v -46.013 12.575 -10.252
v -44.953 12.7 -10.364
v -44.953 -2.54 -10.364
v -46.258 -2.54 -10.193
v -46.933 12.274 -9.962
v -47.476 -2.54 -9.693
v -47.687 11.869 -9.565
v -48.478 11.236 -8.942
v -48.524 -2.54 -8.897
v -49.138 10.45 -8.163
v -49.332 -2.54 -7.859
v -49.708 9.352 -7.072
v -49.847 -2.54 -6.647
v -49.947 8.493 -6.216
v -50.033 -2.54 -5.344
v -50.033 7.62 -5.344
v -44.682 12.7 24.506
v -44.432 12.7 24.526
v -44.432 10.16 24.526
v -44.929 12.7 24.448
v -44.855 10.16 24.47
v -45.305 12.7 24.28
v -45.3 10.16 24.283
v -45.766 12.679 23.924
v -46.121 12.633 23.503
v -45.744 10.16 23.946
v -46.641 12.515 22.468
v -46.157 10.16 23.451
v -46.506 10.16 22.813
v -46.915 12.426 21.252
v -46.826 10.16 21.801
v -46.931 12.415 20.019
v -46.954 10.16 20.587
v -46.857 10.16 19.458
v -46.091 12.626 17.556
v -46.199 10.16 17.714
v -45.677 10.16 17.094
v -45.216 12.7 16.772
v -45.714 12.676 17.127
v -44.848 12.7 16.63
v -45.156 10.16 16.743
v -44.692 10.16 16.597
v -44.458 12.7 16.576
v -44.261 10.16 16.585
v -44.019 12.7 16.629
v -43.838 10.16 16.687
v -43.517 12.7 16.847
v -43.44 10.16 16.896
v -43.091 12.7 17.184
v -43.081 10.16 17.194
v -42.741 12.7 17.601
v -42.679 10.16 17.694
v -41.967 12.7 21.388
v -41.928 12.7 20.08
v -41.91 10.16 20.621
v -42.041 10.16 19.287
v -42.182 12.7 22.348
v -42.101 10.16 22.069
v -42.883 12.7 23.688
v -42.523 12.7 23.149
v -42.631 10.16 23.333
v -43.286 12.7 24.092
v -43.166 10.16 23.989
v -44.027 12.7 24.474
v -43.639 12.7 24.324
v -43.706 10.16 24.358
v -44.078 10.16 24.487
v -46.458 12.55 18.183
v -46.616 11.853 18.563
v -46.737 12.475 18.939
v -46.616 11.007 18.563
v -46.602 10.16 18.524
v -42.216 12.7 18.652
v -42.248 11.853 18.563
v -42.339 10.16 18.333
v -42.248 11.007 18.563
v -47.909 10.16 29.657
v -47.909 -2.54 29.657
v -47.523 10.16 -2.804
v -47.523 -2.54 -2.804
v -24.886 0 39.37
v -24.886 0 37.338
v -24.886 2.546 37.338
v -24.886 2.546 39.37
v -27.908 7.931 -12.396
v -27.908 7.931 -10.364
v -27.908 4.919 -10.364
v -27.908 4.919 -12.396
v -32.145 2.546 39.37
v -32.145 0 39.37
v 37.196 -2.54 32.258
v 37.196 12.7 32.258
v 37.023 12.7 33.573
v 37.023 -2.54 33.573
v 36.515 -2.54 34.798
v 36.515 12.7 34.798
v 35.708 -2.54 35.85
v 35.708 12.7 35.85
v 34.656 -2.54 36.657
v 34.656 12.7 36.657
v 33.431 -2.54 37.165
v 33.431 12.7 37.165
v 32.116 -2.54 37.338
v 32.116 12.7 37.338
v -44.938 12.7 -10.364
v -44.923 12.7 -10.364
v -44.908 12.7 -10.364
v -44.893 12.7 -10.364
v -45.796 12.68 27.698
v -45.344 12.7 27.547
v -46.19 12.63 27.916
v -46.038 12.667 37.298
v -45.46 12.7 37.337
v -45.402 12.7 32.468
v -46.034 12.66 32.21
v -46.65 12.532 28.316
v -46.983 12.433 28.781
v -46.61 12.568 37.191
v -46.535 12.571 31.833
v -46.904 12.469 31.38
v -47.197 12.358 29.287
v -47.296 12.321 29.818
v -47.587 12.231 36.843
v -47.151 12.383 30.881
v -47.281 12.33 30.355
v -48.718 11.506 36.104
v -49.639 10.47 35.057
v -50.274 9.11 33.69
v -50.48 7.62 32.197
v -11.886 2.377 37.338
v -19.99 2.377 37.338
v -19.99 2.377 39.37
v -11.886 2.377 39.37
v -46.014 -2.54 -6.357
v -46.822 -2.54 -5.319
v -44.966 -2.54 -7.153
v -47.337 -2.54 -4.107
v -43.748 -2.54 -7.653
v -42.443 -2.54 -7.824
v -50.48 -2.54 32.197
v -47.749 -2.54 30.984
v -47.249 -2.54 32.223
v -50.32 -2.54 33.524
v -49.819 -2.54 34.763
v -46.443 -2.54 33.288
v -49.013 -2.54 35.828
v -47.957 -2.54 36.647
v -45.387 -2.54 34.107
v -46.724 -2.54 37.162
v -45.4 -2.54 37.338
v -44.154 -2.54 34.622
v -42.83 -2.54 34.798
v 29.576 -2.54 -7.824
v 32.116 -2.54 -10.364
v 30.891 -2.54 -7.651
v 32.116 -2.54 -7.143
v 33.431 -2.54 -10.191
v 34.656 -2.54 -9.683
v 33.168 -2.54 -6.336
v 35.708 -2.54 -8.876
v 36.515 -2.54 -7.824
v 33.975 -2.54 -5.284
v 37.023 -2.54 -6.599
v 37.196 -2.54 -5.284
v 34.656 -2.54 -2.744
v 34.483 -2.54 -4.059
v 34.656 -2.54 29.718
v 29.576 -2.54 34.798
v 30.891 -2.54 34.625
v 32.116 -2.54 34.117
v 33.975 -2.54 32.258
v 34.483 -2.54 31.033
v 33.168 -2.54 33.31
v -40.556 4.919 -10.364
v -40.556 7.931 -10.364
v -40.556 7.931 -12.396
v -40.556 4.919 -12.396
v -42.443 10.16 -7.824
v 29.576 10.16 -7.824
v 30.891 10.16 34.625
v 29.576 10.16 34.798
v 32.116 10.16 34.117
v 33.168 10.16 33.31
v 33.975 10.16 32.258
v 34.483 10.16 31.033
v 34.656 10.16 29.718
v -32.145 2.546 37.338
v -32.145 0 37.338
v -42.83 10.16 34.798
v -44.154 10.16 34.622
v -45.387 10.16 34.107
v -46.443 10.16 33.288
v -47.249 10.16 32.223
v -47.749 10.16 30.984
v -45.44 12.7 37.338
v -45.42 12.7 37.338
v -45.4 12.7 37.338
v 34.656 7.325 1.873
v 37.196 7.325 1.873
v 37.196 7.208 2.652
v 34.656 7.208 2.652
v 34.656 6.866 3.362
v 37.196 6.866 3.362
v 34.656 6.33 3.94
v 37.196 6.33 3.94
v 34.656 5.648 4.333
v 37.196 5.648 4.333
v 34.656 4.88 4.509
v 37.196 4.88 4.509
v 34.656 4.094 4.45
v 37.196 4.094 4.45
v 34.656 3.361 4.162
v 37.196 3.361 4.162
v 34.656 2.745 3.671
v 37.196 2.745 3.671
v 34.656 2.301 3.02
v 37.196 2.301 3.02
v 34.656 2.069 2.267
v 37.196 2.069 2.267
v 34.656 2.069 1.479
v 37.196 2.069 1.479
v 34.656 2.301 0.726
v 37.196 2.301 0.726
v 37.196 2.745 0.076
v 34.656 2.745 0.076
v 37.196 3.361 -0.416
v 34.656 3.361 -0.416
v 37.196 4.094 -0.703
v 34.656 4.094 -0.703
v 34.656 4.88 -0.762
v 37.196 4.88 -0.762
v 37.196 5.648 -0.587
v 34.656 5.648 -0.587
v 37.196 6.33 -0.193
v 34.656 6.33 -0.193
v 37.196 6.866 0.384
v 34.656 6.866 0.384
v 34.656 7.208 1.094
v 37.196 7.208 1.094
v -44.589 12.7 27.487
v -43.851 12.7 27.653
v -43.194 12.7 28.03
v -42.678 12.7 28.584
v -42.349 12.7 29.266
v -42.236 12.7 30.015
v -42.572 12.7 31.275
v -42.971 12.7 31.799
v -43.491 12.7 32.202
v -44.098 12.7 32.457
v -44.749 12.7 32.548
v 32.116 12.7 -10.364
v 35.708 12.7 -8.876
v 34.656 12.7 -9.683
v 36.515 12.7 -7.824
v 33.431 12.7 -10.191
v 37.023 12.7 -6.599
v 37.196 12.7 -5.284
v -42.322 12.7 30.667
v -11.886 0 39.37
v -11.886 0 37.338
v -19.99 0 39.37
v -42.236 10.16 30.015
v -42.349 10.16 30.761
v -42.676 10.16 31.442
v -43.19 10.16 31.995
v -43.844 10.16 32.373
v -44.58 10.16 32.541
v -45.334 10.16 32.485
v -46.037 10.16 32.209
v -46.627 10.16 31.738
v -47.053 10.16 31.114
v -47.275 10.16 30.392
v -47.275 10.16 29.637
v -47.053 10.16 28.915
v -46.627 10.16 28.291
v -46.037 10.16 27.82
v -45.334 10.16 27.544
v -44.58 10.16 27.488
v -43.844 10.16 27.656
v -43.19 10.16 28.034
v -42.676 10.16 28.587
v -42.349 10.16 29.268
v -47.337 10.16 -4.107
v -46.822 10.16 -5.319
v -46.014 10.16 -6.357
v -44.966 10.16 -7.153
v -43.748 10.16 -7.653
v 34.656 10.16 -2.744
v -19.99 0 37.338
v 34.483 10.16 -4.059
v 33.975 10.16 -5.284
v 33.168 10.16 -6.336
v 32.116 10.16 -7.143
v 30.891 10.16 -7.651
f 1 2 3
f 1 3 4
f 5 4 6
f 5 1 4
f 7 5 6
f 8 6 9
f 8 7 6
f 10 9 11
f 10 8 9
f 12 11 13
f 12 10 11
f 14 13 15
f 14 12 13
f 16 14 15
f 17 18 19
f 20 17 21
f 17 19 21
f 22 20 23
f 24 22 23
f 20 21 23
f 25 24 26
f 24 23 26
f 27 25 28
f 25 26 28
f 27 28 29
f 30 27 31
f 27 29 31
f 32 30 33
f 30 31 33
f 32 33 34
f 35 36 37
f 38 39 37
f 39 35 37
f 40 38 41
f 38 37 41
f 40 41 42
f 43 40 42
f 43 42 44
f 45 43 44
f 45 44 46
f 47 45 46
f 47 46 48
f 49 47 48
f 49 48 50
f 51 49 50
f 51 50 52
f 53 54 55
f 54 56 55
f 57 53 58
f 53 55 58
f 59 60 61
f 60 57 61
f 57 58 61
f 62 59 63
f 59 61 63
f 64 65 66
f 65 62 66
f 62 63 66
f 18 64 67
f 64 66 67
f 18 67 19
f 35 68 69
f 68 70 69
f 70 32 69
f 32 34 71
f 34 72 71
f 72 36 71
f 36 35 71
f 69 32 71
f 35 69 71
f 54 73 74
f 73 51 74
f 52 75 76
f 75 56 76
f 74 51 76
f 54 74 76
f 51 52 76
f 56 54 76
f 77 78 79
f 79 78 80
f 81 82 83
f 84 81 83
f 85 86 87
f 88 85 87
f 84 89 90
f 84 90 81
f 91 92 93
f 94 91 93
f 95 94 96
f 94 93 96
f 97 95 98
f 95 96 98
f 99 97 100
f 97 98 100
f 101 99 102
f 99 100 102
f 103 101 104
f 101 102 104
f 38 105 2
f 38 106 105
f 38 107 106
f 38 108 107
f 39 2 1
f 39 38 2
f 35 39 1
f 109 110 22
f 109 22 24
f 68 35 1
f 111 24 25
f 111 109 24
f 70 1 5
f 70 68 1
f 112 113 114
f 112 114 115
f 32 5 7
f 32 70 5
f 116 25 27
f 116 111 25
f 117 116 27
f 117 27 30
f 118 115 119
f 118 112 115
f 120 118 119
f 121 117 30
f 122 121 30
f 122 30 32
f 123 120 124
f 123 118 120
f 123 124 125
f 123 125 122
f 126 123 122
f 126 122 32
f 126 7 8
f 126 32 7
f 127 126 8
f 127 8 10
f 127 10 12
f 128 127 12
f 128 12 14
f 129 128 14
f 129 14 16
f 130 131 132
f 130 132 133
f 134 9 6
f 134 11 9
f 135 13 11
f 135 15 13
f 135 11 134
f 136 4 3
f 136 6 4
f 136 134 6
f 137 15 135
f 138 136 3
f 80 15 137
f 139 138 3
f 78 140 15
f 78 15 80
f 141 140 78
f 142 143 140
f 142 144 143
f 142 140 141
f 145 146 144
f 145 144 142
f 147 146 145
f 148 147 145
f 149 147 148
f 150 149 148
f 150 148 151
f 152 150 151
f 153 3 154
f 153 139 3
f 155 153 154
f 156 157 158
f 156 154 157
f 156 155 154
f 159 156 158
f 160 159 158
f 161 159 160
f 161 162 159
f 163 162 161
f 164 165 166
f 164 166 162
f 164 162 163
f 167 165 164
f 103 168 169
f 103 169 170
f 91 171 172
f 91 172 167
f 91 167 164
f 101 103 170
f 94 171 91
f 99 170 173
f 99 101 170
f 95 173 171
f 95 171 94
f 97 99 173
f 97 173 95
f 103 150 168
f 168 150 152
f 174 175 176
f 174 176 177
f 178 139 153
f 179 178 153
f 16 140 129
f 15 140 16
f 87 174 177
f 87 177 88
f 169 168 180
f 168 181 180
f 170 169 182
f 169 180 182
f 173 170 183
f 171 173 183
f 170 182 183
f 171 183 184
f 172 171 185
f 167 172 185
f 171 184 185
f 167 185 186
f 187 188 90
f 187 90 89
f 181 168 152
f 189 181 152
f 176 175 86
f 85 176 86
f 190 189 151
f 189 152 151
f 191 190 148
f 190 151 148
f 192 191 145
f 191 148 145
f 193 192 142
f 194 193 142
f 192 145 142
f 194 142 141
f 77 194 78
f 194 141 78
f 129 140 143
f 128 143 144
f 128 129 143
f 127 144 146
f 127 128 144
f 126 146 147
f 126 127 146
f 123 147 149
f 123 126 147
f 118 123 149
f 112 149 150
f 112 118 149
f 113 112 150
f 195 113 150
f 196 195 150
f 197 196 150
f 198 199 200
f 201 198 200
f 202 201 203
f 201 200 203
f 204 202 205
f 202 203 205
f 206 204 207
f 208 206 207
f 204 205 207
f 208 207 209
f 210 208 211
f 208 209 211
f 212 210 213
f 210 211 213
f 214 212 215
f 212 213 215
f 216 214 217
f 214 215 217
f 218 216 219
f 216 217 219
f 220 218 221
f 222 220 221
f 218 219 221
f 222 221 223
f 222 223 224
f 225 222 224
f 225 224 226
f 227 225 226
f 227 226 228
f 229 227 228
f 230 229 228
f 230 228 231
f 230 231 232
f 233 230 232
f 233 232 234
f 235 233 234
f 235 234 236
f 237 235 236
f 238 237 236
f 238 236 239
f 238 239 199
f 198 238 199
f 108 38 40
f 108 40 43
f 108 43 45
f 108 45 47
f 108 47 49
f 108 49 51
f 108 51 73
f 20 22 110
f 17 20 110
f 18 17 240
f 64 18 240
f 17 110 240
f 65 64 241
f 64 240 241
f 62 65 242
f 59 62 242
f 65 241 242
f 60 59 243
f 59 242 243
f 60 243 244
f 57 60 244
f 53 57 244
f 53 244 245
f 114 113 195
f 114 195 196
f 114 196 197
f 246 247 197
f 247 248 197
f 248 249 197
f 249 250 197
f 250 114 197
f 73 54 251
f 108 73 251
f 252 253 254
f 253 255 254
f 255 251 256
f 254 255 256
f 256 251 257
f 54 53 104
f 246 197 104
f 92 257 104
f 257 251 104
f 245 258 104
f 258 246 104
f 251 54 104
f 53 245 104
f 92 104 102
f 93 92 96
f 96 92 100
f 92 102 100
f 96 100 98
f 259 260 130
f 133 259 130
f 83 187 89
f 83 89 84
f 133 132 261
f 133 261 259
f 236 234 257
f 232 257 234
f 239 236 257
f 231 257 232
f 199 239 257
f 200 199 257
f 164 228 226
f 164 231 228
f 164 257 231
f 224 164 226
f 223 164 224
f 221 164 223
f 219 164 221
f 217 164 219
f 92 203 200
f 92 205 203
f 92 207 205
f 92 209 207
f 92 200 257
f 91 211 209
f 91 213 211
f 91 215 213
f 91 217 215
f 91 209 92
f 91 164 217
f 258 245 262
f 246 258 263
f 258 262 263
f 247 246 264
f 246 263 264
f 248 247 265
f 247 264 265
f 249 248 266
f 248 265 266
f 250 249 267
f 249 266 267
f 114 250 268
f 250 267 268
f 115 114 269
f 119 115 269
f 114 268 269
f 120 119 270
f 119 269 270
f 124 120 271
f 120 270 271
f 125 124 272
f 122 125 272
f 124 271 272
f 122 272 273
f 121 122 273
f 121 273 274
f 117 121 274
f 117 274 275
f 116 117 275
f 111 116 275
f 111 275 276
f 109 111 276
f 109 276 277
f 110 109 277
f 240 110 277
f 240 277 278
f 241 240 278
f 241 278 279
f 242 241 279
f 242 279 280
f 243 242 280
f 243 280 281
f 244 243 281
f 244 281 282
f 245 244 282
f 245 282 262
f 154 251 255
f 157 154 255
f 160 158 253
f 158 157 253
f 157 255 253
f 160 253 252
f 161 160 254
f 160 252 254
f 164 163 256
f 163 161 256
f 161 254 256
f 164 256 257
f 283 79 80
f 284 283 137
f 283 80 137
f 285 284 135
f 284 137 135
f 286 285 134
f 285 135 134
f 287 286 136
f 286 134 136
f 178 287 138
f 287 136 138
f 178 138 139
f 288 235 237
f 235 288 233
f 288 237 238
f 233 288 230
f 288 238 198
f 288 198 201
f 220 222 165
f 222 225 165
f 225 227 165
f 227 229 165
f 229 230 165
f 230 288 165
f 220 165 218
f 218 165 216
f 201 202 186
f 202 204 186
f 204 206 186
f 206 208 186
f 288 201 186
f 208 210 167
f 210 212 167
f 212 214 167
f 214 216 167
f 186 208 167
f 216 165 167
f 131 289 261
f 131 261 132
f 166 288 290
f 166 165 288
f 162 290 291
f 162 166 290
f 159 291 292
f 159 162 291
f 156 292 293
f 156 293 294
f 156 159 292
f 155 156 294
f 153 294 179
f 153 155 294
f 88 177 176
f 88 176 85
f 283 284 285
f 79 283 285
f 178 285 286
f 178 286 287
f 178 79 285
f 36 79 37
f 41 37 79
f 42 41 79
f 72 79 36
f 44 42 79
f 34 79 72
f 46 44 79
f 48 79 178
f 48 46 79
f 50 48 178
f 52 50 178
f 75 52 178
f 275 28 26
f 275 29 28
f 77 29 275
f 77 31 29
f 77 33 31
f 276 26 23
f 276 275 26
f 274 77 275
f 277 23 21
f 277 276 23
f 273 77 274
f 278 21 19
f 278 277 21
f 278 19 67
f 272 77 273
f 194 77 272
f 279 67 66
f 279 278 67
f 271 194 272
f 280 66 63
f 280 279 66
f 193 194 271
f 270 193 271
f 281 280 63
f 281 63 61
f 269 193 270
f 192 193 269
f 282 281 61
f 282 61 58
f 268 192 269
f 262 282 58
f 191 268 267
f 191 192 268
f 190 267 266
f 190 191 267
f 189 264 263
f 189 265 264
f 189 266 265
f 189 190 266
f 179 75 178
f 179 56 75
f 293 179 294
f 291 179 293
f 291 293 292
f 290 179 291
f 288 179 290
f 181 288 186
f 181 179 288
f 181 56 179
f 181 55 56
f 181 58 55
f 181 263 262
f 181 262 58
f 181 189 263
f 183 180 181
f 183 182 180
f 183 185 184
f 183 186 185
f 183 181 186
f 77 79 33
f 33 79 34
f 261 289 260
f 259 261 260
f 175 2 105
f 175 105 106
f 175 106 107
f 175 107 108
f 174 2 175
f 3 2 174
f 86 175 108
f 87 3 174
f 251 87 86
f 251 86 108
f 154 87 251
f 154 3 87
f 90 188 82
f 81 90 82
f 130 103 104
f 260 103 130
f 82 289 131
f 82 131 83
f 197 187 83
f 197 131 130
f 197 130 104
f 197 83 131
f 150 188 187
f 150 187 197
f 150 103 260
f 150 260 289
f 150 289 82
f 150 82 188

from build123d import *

# Parameters (mm, degrees)
F1_DEPTH    = 12.7
F2_T        = -2.54
F3_R        = 2.5336521523
F4_DEPTH    = 25.4
F5_W        = 12.6487519592
F5_H        = 3.011607565
F6_DEPTH    = 2.032
F7_T1_DEPTH = 51.1041796342
F7_T3_DEPTH = 73.1048124282
F7_T5_DEPTH = 50.4994199847
F7_T7_DEPTH = 50.8
F8_W        = 7.2596892715
F8_H        = 2.5458435994
F8_W_2      = 8.1038391218
F8_H_2      = 2.3770136759
F9_DEPTH    = 2.032
F11_DEPTH   = 5.334
F12_DEPTH   = 10.16
F13_R       = 5.08
F14_R       = 2.6429379381
F15_DEPTH   = 25.4


# Not quite as in the source:
# - a fillet or chamfer that OpenCascade refuses, or shapes differently, is made with other operations: its cross-section is extruded or revolved along the edge and cut away or added


with BuildPart() as f1:
    # F0 (on Front) → F1 (new body, symmetric)
    with BuildSketch(Plane.XZ):
        Polygon((37.1957607567, 37.33773157), (-50.5407974124, 37.33773157), (-49.9729253352, -10.3637007996), (37.1957607567, -10.3637007996), align=None)
    extrude(amount=F1_DEPTH, both=True)

    # F2
    f2_openings = [f1.faces().sort_by_distance(p)[0] for p in [
        (-6.530704, -12.7, 13.512828),
    ]]
    offset(amount=F2_T, openings=f2_openings)

    # F3 (on face) → F4 (cut)
    with BuildSketch(Plane.XZ.offset(-10.16)):
        with Locations((-44.7698123753, 30.0145167857)):
            Circle(F3_R)
    extrude(amount=-F4_DEPTH, mode=Mode.SUBTRACT)

    # F5 (on face) → F6 (join)
    with BuildSketch(Plane(origin=(0, 0, -10.3637007996), x_dir=(1, 0, 0), z_dir=(0, 0, -1))):
        with Locations((-34.2319430783, -6.4247637056)):
            Rectangle(F5_W, F5_H)
    extrude(amount=F6_DEPTH)

    # F7: fillet of radius 5.08 on 5 edges, made by hand

    # F7_s2 → F7_t1 (cut)
    with BuildSketch(Plane.XZ.offset(-25.5520898171)):
        with BuildLine():
            ThreePointArc((-50.4796015492, 32.19725989), (-49.0133806513, 35.8283900433), (-45.3999614856, 37.33773157))
            Line((-45.3999614856, 37.33773157), (-50.5407974124, 37.33773157))
            Line((-50.5407974124, 37.33773157), (-50.4796015492, 32.19725989))
        make_face()
    extrude(amount=F7_T1_DEPTH, mode=Mode.SUBTRACT)

    # F7_s4 → F7_t3 (cut)
    with BuildSketch(Plane(origin=(-0.602773104, 0, 50.6331295472), x_dir=(0, 1, 0), z_dir=(0.011903874, 0, -0.9999291464))):
        with BuildLine():
            ThreePointArc((12.7, -45.0127527613), (11.2121024484, -48.6048552097), (7.62, -50.0927527613))
            Line((7.62, -50.0927527613), (12.7, -50.0927527613))
            Line((12.7, -50.0927527613), (12.7, -45.0127527613))
        make_face()
    extrude(amount=F7_T3_DEPTH, mode=Mode.SUBTRACT)

    # F7_s6 → F7_t5 (cut)
    with BuildSketch(Plane.XZ.offset(-25.2497099923)):
        with BuildLine():
            ThreePointArc((-44.9530413382, -10.3637007996), (-48.5236998115, -8.8971199654), (-50.0326814019, -5.3441724797))
            Line((-50.0326814019, -5.3441724797), (-49.9729253352, -10.3637007996))
            Line((-49.9729253352, -10.3637007996), (-44.9530413382, -10.3637007996))
        make_face()
    extrude(amount=F7_T5_DEPTH, mode=Mode.SUBTRACT)

    # F7_s8 → F7_t7 (cut)
    with BuildSketch(Plane.XZ.offset(-25.4)):
        with BuildLine():
            ThreePointArc((32.1157607567, -10.3637007996), (35.7078632052, -8.8758032481), (37.1957607567, -5.2837007996))
            Line((37.1957607567, -5.2837007996), (37.1957607567, -10.3637007996))
            Line((37.1957607567, -10.3637007996), (32.1157607567, -10.3637007996))
        make_face()
        with BuildLine():
            ThreePointArc((37.1957607567, 32.25773157), (35.7078632052, 35.8498340184), (32.1157607567, 37.33773157))
            Line((32.1157607567, 37.33773157), (37.1957607567, 37.33773157))
            Line((37.1957607567, 37.33773157), (37.1957607567, 32.25773157))
        make_face()
    extrude(amount=F7_T7_DEPTH, mode=Mode.SUBTRACT)

    # F8 (on face) → F9 (join)
    with BuildSketch(Plane.XY.offset(37.33773157)):
        with Locations((-28.5155698657, 1.2729217997)):
            Rectangle(F8_W, F8_H)
        with Locations((-15.9377348609, 1.1885068379)):
            Rectangle(F8_W_2, F8_H_2)
    extrude(amount=F9_DEPTH)

    # F10 (on face) → F11 (cut)
    with BuildSketch(Plane.XZ.offset(-10.16)):
        with BuildLine():
            add(Edge.make_bspline(
                [(-44.4320701063, 24.525936693), (-48.8002594528, 24.525936693), (-46.6161647795, 18.5632575303), (-44.4320701063, 12.6005783677), (-42.247975433, 18.5632575303), (-40.0638807598, 24.525936693), (-44.4320701063, 24.525936693)],
                knots=[0, 0, 0, 2.0943951024, 2.0943951024, 4.1887902048, 4.1887902048, 6.2831853072, 6.2831853072, 6.2831853072], degree=2, weights=[1, 0.5, 1, 0.5, 1, 0.5, 1]))
        make_face()
    extrude(amount=-F11_DEPTH, mode=Mode.SUBTRACT)

    # F12 (cut): a face of the model
    f12_faces = [f1.faces().sort_by_distance(p)[0] for p in [
        (-48.3034140755, -12.7, 35.1268251117),
    ]]
    extrude(f12_faces, amount=-F12_DEPTH, mode=Mode.SUBTRACT)

    # F13
    f13_edges = [f1.edges().sort_by_distance(p)[0] for p in [
        (-47.462983, 3.81, -7.823701),
        (-47.970379, 3.81, 34.797732),
        (34.655761, 3.81, -7.823701),
        (34.655761, 3.81, 34.797732),
    ]]
    fillet(f13_edges, radius=F13_R)

    # F14 (on face) → F15 (cut)
    with BuildSketch(Plane.YZ.offset(37.1957607567)):
        with Locations((4.6823634766, 1.8731907476)):
            Circle(F14_R)
    extrude(amount=-F15_DEPTH, mode=Mode.SUBTRACT)


solid = f1.part
